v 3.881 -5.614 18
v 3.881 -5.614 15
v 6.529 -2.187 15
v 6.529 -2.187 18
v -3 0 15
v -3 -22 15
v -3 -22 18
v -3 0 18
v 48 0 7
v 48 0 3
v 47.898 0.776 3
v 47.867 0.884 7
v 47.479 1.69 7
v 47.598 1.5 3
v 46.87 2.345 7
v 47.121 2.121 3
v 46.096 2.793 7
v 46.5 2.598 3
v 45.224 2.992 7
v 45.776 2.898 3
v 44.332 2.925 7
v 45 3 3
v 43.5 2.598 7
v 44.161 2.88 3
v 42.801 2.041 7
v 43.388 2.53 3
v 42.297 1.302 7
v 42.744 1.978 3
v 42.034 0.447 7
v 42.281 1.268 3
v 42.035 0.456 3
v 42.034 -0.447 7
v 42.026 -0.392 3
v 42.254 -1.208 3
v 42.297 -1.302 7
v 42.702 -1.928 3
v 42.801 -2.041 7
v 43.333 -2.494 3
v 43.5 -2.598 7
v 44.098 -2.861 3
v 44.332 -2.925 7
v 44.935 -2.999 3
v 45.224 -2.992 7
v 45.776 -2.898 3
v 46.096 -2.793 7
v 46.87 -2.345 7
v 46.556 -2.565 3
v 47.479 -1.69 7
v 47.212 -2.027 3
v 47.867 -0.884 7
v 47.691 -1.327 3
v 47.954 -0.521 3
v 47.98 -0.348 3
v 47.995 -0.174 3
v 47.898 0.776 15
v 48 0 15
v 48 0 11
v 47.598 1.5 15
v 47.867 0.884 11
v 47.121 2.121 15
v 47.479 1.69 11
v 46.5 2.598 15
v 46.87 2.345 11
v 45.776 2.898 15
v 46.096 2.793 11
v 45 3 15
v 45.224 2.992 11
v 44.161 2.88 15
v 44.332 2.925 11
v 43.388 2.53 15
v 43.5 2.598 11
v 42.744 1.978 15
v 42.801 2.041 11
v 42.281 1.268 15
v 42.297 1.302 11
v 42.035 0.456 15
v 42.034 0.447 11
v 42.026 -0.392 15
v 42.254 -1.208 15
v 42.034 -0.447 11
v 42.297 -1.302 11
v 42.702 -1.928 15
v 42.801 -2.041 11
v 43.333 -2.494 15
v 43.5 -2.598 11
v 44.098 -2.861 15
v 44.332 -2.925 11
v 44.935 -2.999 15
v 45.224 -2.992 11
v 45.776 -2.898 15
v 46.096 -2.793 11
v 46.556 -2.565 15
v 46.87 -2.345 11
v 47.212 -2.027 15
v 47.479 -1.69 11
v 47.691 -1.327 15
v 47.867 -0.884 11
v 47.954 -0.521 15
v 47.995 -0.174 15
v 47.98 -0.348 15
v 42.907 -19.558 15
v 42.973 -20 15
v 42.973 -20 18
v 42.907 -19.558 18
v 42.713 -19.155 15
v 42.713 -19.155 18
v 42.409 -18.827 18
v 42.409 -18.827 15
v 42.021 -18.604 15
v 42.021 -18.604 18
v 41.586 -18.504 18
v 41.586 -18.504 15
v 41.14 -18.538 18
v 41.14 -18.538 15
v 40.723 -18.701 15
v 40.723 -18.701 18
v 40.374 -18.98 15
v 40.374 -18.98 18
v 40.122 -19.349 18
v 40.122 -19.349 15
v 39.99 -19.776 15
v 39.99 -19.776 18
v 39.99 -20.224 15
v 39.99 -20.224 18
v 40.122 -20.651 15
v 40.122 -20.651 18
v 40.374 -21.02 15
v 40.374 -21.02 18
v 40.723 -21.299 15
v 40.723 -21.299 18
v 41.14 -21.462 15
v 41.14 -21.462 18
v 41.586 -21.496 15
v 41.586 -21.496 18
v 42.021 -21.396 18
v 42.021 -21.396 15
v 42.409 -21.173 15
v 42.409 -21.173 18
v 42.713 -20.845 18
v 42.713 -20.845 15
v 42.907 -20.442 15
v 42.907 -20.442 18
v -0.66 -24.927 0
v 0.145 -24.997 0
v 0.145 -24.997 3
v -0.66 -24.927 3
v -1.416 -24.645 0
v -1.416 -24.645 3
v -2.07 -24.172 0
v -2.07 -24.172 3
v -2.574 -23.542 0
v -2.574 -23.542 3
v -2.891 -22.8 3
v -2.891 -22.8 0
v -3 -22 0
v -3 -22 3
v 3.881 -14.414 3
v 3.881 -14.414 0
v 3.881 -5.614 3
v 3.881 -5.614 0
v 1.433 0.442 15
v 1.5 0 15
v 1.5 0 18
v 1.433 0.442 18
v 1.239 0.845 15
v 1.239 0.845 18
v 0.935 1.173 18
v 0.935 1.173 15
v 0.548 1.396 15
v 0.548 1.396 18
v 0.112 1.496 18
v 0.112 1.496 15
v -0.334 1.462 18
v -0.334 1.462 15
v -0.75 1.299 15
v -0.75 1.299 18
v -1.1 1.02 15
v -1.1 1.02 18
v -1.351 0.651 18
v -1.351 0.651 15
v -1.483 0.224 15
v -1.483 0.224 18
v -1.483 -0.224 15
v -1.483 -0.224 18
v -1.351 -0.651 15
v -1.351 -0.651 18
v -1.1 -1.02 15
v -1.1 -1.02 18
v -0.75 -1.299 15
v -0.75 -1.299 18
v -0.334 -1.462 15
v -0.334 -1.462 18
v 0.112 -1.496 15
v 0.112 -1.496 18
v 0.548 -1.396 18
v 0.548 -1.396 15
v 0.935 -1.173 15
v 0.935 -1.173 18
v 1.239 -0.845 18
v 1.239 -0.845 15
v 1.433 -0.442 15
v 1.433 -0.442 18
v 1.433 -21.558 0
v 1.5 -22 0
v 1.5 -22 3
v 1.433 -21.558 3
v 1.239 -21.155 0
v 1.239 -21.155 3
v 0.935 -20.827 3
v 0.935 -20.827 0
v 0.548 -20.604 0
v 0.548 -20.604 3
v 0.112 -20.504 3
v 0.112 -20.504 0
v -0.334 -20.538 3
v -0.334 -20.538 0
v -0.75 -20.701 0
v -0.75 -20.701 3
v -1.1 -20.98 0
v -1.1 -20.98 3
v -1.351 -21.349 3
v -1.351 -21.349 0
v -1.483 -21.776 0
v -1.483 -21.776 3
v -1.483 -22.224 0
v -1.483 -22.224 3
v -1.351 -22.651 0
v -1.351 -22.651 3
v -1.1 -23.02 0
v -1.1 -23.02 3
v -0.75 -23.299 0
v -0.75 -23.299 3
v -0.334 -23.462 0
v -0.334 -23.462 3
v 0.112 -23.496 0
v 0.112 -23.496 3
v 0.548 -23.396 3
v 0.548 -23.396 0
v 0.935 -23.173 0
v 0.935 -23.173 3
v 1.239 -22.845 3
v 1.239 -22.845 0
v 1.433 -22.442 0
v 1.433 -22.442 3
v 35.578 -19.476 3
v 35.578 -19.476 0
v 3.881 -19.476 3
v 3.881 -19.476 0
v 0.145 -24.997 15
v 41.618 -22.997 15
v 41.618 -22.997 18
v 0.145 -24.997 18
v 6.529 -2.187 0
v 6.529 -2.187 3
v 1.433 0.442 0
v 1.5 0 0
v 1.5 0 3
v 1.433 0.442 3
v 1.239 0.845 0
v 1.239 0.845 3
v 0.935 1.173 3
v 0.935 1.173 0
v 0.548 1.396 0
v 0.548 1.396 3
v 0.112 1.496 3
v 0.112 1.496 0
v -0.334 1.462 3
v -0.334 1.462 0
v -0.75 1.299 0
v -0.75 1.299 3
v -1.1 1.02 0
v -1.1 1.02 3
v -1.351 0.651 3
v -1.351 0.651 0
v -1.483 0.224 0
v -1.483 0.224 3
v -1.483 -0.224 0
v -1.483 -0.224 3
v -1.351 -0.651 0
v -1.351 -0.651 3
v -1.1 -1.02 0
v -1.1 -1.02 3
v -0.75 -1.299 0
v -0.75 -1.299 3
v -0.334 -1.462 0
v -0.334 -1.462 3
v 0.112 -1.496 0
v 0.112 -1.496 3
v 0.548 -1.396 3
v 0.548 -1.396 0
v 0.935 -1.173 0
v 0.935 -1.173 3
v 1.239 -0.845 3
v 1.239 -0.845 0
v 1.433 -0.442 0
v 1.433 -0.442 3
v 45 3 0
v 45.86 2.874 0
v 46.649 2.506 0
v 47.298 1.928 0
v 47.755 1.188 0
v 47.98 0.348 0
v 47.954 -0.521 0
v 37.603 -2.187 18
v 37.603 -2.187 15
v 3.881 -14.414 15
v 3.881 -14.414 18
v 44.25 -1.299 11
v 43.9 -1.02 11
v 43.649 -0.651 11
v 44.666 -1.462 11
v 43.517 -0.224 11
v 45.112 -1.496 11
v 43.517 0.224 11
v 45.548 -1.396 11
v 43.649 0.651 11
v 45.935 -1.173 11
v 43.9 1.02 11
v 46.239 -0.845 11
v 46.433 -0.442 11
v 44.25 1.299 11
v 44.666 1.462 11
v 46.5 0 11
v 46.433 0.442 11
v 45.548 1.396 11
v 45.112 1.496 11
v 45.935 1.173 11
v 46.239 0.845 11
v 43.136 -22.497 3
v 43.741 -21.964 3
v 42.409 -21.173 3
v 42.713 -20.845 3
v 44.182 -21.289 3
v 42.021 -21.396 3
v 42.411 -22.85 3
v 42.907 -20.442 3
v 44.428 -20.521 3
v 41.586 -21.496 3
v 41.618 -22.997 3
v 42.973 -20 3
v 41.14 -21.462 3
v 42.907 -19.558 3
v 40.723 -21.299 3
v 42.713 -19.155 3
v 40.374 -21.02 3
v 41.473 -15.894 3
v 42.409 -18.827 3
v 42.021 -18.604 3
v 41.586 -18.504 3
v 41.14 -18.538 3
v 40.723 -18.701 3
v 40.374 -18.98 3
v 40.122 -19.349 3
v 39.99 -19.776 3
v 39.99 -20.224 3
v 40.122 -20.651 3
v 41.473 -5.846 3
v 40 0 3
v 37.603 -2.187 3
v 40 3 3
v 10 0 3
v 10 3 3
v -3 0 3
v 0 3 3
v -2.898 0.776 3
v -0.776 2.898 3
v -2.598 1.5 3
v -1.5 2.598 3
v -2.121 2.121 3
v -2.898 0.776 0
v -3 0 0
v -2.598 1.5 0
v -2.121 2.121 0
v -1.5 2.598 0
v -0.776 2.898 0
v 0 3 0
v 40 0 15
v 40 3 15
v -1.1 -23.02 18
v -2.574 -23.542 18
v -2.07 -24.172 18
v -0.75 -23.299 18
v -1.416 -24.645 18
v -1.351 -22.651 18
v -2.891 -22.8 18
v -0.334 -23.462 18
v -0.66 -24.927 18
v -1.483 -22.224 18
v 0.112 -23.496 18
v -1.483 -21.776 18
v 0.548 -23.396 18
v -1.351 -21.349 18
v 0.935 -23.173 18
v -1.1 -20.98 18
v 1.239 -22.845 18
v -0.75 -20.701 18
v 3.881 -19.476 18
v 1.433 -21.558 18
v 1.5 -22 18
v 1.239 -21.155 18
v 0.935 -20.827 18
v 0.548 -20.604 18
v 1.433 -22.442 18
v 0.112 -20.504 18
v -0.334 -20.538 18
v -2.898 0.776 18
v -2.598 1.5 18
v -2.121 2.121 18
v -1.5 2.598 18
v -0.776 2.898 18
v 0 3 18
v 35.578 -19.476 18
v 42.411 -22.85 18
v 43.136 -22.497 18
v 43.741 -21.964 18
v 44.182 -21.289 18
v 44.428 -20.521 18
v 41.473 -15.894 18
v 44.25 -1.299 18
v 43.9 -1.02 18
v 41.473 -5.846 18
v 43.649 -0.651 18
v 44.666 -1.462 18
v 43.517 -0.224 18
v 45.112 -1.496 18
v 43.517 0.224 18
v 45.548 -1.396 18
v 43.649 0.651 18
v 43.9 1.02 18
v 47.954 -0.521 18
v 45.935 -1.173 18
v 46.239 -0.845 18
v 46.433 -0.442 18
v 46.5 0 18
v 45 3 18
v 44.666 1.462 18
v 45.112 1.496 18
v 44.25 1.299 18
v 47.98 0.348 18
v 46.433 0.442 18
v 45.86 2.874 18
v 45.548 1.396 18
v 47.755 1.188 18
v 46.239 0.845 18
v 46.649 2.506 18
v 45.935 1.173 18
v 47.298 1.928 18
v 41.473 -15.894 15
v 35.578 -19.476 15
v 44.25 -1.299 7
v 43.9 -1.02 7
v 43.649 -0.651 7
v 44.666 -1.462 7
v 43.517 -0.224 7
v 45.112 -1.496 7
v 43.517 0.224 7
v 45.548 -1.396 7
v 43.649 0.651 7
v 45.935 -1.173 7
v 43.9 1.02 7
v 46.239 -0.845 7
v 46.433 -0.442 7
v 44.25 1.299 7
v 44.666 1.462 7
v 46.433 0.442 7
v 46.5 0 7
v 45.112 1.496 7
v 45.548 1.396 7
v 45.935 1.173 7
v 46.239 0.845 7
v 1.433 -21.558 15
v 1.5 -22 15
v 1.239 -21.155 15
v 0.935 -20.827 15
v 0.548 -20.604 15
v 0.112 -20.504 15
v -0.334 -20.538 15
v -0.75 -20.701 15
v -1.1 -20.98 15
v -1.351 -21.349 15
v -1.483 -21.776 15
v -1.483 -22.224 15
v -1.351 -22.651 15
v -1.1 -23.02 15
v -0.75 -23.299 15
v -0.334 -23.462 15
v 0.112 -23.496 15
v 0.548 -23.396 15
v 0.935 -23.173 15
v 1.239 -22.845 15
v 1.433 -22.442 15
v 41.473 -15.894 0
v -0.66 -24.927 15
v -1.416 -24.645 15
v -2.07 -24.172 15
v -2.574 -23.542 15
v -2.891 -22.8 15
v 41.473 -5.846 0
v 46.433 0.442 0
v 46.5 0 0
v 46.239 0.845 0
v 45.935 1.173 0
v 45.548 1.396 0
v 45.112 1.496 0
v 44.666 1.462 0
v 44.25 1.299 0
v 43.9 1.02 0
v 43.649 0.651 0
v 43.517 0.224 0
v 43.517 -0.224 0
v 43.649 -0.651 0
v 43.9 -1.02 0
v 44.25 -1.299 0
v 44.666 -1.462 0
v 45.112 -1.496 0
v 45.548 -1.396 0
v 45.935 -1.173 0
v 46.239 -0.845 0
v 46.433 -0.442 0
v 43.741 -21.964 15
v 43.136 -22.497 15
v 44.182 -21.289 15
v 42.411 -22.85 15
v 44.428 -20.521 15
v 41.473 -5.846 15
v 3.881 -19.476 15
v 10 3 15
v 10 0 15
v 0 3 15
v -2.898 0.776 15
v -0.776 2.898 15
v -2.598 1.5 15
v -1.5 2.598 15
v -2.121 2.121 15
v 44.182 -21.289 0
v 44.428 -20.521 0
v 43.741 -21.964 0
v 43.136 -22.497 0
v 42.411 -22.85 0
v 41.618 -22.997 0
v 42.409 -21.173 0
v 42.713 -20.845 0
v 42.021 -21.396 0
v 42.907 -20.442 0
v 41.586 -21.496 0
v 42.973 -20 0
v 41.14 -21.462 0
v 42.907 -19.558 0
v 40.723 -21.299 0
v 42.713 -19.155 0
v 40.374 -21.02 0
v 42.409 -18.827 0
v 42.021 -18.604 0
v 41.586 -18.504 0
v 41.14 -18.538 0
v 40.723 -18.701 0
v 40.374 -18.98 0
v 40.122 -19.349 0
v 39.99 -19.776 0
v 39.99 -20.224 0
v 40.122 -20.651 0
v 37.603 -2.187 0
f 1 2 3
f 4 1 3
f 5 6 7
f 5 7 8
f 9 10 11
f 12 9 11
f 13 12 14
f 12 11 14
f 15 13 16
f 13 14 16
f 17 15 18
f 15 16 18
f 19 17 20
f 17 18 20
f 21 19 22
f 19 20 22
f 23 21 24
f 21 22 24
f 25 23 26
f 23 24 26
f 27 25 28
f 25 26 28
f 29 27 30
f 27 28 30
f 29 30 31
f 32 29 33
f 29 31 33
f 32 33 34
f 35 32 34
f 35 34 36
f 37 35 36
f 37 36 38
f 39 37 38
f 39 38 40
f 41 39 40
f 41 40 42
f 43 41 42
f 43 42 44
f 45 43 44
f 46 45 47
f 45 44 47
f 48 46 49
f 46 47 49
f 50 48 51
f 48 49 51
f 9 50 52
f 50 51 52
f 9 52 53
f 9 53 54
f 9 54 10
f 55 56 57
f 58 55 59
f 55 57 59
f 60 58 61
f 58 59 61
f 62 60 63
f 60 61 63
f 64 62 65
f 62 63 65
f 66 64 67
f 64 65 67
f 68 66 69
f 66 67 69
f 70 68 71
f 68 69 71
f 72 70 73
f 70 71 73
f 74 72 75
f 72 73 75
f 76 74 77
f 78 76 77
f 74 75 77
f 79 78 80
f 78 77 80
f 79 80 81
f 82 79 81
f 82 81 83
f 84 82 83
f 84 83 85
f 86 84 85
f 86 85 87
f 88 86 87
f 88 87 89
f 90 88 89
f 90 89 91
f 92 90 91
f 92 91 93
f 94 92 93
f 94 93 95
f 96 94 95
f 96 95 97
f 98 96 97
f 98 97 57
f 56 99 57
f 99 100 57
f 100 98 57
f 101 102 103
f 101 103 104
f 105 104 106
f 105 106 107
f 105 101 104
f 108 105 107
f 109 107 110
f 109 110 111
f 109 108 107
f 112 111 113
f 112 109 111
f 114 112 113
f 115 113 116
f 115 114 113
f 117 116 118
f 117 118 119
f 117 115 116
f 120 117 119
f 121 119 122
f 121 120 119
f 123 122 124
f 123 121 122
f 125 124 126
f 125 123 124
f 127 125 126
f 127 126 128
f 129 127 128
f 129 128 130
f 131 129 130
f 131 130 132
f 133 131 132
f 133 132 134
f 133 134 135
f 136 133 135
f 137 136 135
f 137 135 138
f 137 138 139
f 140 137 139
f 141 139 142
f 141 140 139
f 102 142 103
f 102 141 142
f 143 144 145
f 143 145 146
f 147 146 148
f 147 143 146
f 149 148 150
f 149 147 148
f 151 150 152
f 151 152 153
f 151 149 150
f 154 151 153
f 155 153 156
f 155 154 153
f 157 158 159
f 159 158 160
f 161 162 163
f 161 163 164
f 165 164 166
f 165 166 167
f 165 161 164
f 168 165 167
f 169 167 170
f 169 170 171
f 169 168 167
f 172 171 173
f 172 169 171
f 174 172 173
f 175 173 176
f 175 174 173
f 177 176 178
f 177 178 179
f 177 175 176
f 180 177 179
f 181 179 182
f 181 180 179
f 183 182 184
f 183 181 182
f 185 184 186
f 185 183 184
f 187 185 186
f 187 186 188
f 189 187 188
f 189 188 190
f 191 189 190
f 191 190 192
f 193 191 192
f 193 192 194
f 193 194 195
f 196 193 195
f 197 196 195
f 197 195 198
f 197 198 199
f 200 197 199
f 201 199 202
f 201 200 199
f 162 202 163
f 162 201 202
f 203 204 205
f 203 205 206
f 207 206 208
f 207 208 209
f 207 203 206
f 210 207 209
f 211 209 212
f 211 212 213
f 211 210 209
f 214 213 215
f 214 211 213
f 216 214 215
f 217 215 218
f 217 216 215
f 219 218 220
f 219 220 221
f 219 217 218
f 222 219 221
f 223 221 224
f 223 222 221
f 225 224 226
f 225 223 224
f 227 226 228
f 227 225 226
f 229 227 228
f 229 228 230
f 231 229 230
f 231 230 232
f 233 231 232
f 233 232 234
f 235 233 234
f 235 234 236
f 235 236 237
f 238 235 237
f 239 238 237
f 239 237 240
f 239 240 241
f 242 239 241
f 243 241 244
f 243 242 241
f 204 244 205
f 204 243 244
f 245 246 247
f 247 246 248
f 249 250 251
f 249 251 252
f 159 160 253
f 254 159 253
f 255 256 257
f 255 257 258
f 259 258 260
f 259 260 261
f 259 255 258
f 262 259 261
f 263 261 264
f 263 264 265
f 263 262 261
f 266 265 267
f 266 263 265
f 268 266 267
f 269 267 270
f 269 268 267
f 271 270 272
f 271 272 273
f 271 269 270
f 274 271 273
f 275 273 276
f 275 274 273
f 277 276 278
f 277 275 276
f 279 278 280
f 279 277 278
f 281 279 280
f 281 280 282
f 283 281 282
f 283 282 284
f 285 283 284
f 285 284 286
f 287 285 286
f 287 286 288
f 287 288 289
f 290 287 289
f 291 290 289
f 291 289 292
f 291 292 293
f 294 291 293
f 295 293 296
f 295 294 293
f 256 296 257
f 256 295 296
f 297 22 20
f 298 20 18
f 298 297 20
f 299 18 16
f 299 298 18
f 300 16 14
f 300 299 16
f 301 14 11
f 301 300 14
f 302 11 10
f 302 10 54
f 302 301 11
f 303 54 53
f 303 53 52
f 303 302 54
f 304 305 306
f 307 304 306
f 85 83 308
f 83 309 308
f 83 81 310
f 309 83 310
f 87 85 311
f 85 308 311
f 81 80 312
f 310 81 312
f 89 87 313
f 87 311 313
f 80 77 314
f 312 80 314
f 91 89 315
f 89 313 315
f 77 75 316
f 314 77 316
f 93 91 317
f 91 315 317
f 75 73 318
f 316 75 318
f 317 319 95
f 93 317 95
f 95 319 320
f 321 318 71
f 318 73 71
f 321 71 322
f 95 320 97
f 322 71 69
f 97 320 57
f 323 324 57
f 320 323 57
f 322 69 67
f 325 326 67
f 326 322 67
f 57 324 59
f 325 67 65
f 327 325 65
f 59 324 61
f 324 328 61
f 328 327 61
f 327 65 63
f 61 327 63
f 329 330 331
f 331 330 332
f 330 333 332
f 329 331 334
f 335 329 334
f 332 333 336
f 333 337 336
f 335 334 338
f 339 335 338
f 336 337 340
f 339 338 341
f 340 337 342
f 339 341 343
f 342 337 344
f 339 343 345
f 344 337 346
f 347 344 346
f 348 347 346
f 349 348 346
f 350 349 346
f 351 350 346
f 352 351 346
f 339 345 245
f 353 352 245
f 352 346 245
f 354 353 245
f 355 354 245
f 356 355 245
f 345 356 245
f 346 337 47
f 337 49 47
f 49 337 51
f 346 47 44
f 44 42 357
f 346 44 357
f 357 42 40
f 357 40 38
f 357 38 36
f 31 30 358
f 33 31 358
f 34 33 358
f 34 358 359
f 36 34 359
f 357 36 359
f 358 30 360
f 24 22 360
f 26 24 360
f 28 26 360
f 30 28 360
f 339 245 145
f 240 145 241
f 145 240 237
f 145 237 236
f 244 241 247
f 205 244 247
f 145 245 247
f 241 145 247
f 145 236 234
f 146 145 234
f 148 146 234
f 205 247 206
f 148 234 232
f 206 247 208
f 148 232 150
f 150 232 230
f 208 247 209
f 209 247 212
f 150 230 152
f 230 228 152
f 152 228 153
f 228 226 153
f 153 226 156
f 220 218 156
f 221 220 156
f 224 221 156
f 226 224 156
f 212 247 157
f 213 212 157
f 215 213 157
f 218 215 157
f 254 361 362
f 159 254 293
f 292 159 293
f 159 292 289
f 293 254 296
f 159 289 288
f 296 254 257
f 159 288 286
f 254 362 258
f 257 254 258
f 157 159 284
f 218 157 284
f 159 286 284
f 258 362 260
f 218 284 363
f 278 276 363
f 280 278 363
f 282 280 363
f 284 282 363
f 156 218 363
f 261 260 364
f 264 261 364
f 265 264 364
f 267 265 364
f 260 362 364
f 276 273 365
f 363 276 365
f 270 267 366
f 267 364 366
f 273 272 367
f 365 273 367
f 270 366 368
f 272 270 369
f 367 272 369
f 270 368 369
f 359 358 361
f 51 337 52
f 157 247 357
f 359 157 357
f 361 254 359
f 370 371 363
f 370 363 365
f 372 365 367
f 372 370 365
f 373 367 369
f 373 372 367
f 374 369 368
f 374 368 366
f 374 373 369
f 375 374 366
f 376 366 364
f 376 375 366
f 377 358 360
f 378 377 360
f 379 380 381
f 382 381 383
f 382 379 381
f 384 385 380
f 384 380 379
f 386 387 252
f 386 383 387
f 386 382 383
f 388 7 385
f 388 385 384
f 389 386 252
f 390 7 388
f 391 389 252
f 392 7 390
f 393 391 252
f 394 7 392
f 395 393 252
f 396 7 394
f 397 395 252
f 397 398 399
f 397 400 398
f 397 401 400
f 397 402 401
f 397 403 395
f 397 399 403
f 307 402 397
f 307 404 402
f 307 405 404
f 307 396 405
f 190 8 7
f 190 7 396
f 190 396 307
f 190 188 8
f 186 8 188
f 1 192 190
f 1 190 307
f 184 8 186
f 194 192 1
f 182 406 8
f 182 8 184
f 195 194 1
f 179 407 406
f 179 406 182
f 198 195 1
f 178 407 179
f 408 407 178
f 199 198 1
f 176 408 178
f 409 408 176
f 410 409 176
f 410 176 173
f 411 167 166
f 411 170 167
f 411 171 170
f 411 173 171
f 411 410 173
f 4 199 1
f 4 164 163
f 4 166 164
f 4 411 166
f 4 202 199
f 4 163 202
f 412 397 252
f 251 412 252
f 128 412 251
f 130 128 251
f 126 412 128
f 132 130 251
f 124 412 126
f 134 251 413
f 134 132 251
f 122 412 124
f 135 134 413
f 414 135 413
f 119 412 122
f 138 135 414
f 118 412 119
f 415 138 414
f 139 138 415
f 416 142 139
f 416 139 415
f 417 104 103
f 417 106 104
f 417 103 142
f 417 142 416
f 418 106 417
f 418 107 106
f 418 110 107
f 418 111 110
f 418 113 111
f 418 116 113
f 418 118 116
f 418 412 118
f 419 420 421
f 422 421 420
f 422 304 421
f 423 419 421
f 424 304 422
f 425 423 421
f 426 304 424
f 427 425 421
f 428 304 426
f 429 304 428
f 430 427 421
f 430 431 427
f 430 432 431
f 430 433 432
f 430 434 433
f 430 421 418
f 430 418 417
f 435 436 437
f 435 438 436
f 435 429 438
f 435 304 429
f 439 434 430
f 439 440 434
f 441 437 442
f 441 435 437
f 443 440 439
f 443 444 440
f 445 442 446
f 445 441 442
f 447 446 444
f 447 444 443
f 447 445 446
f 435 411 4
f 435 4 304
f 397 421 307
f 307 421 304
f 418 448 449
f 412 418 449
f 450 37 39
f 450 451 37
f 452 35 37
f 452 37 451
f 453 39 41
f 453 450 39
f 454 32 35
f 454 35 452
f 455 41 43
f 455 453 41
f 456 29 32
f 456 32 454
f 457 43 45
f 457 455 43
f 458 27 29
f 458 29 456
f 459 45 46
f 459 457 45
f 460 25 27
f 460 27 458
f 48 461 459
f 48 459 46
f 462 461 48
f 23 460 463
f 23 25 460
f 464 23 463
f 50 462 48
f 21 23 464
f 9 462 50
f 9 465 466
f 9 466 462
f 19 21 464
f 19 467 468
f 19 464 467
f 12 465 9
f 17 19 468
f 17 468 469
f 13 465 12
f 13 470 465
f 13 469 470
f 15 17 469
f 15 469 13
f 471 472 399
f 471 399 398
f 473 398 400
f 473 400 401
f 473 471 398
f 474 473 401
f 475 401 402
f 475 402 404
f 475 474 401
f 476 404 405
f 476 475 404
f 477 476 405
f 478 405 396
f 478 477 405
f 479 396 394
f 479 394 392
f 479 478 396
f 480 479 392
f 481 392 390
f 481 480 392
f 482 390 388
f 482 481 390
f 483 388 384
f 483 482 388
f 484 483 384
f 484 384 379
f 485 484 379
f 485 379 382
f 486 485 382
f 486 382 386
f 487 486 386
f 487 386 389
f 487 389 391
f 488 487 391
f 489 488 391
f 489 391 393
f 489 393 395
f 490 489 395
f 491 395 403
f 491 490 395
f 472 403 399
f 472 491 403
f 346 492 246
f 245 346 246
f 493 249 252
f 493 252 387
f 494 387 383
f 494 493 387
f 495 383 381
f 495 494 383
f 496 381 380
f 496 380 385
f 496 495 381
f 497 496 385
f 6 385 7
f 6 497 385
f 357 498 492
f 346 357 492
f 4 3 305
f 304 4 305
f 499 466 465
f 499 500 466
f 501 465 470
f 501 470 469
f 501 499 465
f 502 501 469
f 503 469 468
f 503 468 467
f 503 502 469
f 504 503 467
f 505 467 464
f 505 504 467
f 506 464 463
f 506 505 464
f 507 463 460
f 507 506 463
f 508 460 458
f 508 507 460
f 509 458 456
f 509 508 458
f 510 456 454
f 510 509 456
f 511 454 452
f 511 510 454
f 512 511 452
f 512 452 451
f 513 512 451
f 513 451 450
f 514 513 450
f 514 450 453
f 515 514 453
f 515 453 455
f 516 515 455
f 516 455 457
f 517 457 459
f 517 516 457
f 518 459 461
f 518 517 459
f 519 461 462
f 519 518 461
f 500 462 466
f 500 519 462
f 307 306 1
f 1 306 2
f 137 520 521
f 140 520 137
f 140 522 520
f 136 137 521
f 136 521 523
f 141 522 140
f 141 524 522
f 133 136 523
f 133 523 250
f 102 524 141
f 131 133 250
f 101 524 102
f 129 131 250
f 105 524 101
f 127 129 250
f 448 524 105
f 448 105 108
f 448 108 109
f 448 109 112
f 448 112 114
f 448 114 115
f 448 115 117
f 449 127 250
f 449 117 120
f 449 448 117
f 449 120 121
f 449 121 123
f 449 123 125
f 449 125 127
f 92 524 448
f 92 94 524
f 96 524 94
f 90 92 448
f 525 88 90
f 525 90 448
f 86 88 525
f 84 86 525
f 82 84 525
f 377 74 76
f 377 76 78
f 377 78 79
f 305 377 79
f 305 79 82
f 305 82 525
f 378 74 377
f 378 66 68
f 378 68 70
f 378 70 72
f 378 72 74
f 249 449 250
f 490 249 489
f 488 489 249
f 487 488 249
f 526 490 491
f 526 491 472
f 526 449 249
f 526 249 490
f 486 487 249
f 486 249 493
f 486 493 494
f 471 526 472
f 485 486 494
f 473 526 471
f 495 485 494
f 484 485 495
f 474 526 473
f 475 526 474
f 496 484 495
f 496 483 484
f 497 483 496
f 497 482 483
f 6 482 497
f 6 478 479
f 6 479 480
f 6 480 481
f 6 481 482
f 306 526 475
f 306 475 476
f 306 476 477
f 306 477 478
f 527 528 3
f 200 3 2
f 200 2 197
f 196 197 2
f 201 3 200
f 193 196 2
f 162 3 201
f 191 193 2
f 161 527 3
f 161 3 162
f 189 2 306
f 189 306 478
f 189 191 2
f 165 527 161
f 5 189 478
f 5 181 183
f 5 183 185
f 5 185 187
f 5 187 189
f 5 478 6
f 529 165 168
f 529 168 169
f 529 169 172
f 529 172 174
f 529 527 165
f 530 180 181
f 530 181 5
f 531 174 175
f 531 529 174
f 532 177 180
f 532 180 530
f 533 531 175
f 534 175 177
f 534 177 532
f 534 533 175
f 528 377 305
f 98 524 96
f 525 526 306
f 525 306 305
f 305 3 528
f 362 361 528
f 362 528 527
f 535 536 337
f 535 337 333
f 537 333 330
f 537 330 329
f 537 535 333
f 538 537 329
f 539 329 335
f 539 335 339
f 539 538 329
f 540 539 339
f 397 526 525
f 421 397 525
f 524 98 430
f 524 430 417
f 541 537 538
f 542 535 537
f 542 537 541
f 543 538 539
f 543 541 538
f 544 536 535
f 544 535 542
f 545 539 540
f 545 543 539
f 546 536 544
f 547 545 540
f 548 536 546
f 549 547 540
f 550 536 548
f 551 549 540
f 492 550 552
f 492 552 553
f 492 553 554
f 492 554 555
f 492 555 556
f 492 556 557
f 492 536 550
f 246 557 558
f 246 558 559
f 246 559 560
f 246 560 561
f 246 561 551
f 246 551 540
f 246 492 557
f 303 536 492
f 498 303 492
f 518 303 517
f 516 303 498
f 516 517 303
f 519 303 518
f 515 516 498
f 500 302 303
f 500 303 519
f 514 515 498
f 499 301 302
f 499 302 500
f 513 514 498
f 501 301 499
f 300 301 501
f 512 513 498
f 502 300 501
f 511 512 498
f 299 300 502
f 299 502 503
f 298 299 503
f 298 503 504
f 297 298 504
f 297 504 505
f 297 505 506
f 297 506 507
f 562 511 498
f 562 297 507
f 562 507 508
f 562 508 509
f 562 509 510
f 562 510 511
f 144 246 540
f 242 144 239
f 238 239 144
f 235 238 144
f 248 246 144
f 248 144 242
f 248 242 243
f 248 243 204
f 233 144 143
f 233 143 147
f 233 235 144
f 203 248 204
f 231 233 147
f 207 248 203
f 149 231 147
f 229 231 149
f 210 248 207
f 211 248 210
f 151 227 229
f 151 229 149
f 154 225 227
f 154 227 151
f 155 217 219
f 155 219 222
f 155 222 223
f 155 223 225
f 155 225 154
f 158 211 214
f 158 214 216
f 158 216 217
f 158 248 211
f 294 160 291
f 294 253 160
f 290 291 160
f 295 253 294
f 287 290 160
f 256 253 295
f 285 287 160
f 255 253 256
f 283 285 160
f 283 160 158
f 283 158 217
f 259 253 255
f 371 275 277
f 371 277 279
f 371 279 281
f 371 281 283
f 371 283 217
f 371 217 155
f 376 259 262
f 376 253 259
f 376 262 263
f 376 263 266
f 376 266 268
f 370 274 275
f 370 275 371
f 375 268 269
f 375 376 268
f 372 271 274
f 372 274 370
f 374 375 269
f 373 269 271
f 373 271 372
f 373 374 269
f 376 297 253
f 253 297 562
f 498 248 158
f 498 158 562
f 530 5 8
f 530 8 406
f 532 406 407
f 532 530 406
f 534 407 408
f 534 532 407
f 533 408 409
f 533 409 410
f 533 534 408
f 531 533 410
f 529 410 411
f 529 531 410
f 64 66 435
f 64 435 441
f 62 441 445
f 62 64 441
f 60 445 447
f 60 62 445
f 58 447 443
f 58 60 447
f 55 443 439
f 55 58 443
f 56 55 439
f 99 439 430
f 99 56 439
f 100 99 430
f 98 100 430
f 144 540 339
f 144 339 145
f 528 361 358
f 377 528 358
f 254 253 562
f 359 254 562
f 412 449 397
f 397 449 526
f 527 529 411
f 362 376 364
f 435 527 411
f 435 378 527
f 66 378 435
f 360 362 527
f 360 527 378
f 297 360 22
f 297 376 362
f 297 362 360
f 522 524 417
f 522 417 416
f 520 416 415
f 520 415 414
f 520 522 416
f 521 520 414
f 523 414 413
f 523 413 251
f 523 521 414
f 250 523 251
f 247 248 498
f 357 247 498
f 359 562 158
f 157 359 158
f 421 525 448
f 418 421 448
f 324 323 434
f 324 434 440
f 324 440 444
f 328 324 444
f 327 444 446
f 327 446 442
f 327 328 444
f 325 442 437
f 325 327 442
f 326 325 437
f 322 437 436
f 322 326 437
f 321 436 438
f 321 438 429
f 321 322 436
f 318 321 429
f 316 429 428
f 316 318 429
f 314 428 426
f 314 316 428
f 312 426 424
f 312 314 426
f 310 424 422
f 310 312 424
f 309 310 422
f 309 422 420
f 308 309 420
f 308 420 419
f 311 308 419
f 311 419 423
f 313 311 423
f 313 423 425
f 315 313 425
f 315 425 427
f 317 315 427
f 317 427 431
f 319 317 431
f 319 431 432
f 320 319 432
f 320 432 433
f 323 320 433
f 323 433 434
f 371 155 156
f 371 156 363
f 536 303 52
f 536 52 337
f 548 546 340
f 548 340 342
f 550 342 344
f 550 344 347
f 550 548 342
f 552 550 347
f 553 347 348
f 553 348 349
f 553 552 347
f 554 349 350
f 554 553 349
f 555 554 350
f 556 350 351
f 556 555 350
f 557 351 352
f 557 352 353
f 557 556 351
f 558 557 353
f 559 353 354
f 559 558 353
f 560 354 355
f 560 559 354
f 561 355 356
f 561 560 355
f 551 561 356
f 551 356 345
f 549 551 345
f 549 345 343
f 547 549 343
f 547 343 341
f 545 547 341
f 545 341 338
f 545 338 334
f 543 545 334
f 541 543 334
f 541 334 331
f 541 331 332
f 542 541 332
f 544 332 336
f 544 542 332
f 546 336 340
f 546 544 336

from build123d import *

# Parameters (mm, degrees)
SKETCH1_R           = 1.5
BOSS_EXTRUDE1_DEPTH = 3
LPATTERN1_COUNT     = 2
LPATTERN1_PITCH     = 15
SKETCH2_R           = 3
SKETCH2_R_2         = 1.5
BOSS_EXTRUDE2_DEPTH = 4
LPATTERN2_COUNT     = 2
LPATTERN2_PITCH     = 8
SKETCH3_W           = 30
SKETCH3_H           = 3
BOSS_EXTRUDE3_DEPTH = 15


with BuildPart() as part:
    # Sketch1 → Boss-Extrude1 (new body)
    with BuildSketch(Plane.XY):
        with BuildLine():
            Line((0, 3), (45, 3))
            ThreePointArc((45, 3), (47.298133329, 1.928362829), (47.954423259, -0.520944533))
            Line((47.954423259, -0.520944533), (44.427883645, -20.520944533))
            ThreePointArc((44.427883645, -20.520944533), (43.456627447, -22.25101053), (41.617963293, -22.996517797))
            Line((41.617963293, -22.996517797), (0.144502907, -24.996517797))
            ThreePointArc((0.144502907, -24.996517797), (-2.069600357, -24.171809006), (-3, -22))
            Line((-3, -22), (-3, 0))
            ThreePointArc((-3, 0), (-2.121320344, 2.121320344), (0, 3))
        make_face()
        with Locations((45, 0)):
            Circle(SKETCH1_R, mode=Mode.SUBTRACT)
        with Locations((41.473460386, -20)):
            Circle(SKETCH1_R, mode=Mode.SUBTRACT)
        with Locations((0, -22)):
            Circle(SKETCH1_R, mode=Mode.SUBTRACT)
        Circle(SKETCH1_R, mode=Mode.SUBTRACT)
        Polygon((3.881124623, -14.414030159), (3.881124623, -5.613630965), (6.529032345, -2.186926854), (37.60300826, -2.186926854), align=None, mode=Mode.SUBTRACT)
        Polygon((3.881124623, -19.476206686), (41.473460386, -5.845729285), (41.473460386, -15.893743297), (35.578137649, -19.476206686), align=None, mode=Mode.SUBTRACT)
    extrude(amount=BOSS_EXTRUDE1_DEPTH)


with BuildPart() as lpattern1_1:
    # LPattern1: pattern copy
    add(part.part.moved(Location(Vector(0, 0, 1) * (1 * LPATTERN1_PITCH))))


with BuildPart() as part_1:
    add(part.part)

    # Sketch2 → Boss-Extrude2 (add)
    with BuildSketch(Plane.XY.offset(3)):
        with Locations((45, 0)):
            Circle(SKETCH2_R)
        with Locations((45, 0)):
            Circle(SKETCH2_R_2, mode=Mode.SUBTRACT)
    boss_extrude2 = extrude(amount=BOSS_EXTRUDE2_DEPTH)



with BuildPart() as lpattern1_1_1:
    add(lpattern1_1.part)

    # LPattern2: Boss-Extrude2 ×2
    with Locations(*[(0, 0, i * LPATTERN2_PITCH) for i in range(1, LPATTERN2_COUNT)]):
        add(boss_extrude2)


with BuildPart() as part_2:
    add(part_1.part)

    add(lpattern1_1_1.part)  # Boss-Extrude3 merges LPattern1_1
    # Sketch3 → Boss-Extrude3 (add)
    with BuildSketch(Plane.XY.offset(3)):
        with Locations((25, 1.5)):
            Rectangle(SKETCH3_W, SKETCH3_H)
    extrude(amount=BOSS_EXTRUDE3_DEPTH)


solid = part_2.part
